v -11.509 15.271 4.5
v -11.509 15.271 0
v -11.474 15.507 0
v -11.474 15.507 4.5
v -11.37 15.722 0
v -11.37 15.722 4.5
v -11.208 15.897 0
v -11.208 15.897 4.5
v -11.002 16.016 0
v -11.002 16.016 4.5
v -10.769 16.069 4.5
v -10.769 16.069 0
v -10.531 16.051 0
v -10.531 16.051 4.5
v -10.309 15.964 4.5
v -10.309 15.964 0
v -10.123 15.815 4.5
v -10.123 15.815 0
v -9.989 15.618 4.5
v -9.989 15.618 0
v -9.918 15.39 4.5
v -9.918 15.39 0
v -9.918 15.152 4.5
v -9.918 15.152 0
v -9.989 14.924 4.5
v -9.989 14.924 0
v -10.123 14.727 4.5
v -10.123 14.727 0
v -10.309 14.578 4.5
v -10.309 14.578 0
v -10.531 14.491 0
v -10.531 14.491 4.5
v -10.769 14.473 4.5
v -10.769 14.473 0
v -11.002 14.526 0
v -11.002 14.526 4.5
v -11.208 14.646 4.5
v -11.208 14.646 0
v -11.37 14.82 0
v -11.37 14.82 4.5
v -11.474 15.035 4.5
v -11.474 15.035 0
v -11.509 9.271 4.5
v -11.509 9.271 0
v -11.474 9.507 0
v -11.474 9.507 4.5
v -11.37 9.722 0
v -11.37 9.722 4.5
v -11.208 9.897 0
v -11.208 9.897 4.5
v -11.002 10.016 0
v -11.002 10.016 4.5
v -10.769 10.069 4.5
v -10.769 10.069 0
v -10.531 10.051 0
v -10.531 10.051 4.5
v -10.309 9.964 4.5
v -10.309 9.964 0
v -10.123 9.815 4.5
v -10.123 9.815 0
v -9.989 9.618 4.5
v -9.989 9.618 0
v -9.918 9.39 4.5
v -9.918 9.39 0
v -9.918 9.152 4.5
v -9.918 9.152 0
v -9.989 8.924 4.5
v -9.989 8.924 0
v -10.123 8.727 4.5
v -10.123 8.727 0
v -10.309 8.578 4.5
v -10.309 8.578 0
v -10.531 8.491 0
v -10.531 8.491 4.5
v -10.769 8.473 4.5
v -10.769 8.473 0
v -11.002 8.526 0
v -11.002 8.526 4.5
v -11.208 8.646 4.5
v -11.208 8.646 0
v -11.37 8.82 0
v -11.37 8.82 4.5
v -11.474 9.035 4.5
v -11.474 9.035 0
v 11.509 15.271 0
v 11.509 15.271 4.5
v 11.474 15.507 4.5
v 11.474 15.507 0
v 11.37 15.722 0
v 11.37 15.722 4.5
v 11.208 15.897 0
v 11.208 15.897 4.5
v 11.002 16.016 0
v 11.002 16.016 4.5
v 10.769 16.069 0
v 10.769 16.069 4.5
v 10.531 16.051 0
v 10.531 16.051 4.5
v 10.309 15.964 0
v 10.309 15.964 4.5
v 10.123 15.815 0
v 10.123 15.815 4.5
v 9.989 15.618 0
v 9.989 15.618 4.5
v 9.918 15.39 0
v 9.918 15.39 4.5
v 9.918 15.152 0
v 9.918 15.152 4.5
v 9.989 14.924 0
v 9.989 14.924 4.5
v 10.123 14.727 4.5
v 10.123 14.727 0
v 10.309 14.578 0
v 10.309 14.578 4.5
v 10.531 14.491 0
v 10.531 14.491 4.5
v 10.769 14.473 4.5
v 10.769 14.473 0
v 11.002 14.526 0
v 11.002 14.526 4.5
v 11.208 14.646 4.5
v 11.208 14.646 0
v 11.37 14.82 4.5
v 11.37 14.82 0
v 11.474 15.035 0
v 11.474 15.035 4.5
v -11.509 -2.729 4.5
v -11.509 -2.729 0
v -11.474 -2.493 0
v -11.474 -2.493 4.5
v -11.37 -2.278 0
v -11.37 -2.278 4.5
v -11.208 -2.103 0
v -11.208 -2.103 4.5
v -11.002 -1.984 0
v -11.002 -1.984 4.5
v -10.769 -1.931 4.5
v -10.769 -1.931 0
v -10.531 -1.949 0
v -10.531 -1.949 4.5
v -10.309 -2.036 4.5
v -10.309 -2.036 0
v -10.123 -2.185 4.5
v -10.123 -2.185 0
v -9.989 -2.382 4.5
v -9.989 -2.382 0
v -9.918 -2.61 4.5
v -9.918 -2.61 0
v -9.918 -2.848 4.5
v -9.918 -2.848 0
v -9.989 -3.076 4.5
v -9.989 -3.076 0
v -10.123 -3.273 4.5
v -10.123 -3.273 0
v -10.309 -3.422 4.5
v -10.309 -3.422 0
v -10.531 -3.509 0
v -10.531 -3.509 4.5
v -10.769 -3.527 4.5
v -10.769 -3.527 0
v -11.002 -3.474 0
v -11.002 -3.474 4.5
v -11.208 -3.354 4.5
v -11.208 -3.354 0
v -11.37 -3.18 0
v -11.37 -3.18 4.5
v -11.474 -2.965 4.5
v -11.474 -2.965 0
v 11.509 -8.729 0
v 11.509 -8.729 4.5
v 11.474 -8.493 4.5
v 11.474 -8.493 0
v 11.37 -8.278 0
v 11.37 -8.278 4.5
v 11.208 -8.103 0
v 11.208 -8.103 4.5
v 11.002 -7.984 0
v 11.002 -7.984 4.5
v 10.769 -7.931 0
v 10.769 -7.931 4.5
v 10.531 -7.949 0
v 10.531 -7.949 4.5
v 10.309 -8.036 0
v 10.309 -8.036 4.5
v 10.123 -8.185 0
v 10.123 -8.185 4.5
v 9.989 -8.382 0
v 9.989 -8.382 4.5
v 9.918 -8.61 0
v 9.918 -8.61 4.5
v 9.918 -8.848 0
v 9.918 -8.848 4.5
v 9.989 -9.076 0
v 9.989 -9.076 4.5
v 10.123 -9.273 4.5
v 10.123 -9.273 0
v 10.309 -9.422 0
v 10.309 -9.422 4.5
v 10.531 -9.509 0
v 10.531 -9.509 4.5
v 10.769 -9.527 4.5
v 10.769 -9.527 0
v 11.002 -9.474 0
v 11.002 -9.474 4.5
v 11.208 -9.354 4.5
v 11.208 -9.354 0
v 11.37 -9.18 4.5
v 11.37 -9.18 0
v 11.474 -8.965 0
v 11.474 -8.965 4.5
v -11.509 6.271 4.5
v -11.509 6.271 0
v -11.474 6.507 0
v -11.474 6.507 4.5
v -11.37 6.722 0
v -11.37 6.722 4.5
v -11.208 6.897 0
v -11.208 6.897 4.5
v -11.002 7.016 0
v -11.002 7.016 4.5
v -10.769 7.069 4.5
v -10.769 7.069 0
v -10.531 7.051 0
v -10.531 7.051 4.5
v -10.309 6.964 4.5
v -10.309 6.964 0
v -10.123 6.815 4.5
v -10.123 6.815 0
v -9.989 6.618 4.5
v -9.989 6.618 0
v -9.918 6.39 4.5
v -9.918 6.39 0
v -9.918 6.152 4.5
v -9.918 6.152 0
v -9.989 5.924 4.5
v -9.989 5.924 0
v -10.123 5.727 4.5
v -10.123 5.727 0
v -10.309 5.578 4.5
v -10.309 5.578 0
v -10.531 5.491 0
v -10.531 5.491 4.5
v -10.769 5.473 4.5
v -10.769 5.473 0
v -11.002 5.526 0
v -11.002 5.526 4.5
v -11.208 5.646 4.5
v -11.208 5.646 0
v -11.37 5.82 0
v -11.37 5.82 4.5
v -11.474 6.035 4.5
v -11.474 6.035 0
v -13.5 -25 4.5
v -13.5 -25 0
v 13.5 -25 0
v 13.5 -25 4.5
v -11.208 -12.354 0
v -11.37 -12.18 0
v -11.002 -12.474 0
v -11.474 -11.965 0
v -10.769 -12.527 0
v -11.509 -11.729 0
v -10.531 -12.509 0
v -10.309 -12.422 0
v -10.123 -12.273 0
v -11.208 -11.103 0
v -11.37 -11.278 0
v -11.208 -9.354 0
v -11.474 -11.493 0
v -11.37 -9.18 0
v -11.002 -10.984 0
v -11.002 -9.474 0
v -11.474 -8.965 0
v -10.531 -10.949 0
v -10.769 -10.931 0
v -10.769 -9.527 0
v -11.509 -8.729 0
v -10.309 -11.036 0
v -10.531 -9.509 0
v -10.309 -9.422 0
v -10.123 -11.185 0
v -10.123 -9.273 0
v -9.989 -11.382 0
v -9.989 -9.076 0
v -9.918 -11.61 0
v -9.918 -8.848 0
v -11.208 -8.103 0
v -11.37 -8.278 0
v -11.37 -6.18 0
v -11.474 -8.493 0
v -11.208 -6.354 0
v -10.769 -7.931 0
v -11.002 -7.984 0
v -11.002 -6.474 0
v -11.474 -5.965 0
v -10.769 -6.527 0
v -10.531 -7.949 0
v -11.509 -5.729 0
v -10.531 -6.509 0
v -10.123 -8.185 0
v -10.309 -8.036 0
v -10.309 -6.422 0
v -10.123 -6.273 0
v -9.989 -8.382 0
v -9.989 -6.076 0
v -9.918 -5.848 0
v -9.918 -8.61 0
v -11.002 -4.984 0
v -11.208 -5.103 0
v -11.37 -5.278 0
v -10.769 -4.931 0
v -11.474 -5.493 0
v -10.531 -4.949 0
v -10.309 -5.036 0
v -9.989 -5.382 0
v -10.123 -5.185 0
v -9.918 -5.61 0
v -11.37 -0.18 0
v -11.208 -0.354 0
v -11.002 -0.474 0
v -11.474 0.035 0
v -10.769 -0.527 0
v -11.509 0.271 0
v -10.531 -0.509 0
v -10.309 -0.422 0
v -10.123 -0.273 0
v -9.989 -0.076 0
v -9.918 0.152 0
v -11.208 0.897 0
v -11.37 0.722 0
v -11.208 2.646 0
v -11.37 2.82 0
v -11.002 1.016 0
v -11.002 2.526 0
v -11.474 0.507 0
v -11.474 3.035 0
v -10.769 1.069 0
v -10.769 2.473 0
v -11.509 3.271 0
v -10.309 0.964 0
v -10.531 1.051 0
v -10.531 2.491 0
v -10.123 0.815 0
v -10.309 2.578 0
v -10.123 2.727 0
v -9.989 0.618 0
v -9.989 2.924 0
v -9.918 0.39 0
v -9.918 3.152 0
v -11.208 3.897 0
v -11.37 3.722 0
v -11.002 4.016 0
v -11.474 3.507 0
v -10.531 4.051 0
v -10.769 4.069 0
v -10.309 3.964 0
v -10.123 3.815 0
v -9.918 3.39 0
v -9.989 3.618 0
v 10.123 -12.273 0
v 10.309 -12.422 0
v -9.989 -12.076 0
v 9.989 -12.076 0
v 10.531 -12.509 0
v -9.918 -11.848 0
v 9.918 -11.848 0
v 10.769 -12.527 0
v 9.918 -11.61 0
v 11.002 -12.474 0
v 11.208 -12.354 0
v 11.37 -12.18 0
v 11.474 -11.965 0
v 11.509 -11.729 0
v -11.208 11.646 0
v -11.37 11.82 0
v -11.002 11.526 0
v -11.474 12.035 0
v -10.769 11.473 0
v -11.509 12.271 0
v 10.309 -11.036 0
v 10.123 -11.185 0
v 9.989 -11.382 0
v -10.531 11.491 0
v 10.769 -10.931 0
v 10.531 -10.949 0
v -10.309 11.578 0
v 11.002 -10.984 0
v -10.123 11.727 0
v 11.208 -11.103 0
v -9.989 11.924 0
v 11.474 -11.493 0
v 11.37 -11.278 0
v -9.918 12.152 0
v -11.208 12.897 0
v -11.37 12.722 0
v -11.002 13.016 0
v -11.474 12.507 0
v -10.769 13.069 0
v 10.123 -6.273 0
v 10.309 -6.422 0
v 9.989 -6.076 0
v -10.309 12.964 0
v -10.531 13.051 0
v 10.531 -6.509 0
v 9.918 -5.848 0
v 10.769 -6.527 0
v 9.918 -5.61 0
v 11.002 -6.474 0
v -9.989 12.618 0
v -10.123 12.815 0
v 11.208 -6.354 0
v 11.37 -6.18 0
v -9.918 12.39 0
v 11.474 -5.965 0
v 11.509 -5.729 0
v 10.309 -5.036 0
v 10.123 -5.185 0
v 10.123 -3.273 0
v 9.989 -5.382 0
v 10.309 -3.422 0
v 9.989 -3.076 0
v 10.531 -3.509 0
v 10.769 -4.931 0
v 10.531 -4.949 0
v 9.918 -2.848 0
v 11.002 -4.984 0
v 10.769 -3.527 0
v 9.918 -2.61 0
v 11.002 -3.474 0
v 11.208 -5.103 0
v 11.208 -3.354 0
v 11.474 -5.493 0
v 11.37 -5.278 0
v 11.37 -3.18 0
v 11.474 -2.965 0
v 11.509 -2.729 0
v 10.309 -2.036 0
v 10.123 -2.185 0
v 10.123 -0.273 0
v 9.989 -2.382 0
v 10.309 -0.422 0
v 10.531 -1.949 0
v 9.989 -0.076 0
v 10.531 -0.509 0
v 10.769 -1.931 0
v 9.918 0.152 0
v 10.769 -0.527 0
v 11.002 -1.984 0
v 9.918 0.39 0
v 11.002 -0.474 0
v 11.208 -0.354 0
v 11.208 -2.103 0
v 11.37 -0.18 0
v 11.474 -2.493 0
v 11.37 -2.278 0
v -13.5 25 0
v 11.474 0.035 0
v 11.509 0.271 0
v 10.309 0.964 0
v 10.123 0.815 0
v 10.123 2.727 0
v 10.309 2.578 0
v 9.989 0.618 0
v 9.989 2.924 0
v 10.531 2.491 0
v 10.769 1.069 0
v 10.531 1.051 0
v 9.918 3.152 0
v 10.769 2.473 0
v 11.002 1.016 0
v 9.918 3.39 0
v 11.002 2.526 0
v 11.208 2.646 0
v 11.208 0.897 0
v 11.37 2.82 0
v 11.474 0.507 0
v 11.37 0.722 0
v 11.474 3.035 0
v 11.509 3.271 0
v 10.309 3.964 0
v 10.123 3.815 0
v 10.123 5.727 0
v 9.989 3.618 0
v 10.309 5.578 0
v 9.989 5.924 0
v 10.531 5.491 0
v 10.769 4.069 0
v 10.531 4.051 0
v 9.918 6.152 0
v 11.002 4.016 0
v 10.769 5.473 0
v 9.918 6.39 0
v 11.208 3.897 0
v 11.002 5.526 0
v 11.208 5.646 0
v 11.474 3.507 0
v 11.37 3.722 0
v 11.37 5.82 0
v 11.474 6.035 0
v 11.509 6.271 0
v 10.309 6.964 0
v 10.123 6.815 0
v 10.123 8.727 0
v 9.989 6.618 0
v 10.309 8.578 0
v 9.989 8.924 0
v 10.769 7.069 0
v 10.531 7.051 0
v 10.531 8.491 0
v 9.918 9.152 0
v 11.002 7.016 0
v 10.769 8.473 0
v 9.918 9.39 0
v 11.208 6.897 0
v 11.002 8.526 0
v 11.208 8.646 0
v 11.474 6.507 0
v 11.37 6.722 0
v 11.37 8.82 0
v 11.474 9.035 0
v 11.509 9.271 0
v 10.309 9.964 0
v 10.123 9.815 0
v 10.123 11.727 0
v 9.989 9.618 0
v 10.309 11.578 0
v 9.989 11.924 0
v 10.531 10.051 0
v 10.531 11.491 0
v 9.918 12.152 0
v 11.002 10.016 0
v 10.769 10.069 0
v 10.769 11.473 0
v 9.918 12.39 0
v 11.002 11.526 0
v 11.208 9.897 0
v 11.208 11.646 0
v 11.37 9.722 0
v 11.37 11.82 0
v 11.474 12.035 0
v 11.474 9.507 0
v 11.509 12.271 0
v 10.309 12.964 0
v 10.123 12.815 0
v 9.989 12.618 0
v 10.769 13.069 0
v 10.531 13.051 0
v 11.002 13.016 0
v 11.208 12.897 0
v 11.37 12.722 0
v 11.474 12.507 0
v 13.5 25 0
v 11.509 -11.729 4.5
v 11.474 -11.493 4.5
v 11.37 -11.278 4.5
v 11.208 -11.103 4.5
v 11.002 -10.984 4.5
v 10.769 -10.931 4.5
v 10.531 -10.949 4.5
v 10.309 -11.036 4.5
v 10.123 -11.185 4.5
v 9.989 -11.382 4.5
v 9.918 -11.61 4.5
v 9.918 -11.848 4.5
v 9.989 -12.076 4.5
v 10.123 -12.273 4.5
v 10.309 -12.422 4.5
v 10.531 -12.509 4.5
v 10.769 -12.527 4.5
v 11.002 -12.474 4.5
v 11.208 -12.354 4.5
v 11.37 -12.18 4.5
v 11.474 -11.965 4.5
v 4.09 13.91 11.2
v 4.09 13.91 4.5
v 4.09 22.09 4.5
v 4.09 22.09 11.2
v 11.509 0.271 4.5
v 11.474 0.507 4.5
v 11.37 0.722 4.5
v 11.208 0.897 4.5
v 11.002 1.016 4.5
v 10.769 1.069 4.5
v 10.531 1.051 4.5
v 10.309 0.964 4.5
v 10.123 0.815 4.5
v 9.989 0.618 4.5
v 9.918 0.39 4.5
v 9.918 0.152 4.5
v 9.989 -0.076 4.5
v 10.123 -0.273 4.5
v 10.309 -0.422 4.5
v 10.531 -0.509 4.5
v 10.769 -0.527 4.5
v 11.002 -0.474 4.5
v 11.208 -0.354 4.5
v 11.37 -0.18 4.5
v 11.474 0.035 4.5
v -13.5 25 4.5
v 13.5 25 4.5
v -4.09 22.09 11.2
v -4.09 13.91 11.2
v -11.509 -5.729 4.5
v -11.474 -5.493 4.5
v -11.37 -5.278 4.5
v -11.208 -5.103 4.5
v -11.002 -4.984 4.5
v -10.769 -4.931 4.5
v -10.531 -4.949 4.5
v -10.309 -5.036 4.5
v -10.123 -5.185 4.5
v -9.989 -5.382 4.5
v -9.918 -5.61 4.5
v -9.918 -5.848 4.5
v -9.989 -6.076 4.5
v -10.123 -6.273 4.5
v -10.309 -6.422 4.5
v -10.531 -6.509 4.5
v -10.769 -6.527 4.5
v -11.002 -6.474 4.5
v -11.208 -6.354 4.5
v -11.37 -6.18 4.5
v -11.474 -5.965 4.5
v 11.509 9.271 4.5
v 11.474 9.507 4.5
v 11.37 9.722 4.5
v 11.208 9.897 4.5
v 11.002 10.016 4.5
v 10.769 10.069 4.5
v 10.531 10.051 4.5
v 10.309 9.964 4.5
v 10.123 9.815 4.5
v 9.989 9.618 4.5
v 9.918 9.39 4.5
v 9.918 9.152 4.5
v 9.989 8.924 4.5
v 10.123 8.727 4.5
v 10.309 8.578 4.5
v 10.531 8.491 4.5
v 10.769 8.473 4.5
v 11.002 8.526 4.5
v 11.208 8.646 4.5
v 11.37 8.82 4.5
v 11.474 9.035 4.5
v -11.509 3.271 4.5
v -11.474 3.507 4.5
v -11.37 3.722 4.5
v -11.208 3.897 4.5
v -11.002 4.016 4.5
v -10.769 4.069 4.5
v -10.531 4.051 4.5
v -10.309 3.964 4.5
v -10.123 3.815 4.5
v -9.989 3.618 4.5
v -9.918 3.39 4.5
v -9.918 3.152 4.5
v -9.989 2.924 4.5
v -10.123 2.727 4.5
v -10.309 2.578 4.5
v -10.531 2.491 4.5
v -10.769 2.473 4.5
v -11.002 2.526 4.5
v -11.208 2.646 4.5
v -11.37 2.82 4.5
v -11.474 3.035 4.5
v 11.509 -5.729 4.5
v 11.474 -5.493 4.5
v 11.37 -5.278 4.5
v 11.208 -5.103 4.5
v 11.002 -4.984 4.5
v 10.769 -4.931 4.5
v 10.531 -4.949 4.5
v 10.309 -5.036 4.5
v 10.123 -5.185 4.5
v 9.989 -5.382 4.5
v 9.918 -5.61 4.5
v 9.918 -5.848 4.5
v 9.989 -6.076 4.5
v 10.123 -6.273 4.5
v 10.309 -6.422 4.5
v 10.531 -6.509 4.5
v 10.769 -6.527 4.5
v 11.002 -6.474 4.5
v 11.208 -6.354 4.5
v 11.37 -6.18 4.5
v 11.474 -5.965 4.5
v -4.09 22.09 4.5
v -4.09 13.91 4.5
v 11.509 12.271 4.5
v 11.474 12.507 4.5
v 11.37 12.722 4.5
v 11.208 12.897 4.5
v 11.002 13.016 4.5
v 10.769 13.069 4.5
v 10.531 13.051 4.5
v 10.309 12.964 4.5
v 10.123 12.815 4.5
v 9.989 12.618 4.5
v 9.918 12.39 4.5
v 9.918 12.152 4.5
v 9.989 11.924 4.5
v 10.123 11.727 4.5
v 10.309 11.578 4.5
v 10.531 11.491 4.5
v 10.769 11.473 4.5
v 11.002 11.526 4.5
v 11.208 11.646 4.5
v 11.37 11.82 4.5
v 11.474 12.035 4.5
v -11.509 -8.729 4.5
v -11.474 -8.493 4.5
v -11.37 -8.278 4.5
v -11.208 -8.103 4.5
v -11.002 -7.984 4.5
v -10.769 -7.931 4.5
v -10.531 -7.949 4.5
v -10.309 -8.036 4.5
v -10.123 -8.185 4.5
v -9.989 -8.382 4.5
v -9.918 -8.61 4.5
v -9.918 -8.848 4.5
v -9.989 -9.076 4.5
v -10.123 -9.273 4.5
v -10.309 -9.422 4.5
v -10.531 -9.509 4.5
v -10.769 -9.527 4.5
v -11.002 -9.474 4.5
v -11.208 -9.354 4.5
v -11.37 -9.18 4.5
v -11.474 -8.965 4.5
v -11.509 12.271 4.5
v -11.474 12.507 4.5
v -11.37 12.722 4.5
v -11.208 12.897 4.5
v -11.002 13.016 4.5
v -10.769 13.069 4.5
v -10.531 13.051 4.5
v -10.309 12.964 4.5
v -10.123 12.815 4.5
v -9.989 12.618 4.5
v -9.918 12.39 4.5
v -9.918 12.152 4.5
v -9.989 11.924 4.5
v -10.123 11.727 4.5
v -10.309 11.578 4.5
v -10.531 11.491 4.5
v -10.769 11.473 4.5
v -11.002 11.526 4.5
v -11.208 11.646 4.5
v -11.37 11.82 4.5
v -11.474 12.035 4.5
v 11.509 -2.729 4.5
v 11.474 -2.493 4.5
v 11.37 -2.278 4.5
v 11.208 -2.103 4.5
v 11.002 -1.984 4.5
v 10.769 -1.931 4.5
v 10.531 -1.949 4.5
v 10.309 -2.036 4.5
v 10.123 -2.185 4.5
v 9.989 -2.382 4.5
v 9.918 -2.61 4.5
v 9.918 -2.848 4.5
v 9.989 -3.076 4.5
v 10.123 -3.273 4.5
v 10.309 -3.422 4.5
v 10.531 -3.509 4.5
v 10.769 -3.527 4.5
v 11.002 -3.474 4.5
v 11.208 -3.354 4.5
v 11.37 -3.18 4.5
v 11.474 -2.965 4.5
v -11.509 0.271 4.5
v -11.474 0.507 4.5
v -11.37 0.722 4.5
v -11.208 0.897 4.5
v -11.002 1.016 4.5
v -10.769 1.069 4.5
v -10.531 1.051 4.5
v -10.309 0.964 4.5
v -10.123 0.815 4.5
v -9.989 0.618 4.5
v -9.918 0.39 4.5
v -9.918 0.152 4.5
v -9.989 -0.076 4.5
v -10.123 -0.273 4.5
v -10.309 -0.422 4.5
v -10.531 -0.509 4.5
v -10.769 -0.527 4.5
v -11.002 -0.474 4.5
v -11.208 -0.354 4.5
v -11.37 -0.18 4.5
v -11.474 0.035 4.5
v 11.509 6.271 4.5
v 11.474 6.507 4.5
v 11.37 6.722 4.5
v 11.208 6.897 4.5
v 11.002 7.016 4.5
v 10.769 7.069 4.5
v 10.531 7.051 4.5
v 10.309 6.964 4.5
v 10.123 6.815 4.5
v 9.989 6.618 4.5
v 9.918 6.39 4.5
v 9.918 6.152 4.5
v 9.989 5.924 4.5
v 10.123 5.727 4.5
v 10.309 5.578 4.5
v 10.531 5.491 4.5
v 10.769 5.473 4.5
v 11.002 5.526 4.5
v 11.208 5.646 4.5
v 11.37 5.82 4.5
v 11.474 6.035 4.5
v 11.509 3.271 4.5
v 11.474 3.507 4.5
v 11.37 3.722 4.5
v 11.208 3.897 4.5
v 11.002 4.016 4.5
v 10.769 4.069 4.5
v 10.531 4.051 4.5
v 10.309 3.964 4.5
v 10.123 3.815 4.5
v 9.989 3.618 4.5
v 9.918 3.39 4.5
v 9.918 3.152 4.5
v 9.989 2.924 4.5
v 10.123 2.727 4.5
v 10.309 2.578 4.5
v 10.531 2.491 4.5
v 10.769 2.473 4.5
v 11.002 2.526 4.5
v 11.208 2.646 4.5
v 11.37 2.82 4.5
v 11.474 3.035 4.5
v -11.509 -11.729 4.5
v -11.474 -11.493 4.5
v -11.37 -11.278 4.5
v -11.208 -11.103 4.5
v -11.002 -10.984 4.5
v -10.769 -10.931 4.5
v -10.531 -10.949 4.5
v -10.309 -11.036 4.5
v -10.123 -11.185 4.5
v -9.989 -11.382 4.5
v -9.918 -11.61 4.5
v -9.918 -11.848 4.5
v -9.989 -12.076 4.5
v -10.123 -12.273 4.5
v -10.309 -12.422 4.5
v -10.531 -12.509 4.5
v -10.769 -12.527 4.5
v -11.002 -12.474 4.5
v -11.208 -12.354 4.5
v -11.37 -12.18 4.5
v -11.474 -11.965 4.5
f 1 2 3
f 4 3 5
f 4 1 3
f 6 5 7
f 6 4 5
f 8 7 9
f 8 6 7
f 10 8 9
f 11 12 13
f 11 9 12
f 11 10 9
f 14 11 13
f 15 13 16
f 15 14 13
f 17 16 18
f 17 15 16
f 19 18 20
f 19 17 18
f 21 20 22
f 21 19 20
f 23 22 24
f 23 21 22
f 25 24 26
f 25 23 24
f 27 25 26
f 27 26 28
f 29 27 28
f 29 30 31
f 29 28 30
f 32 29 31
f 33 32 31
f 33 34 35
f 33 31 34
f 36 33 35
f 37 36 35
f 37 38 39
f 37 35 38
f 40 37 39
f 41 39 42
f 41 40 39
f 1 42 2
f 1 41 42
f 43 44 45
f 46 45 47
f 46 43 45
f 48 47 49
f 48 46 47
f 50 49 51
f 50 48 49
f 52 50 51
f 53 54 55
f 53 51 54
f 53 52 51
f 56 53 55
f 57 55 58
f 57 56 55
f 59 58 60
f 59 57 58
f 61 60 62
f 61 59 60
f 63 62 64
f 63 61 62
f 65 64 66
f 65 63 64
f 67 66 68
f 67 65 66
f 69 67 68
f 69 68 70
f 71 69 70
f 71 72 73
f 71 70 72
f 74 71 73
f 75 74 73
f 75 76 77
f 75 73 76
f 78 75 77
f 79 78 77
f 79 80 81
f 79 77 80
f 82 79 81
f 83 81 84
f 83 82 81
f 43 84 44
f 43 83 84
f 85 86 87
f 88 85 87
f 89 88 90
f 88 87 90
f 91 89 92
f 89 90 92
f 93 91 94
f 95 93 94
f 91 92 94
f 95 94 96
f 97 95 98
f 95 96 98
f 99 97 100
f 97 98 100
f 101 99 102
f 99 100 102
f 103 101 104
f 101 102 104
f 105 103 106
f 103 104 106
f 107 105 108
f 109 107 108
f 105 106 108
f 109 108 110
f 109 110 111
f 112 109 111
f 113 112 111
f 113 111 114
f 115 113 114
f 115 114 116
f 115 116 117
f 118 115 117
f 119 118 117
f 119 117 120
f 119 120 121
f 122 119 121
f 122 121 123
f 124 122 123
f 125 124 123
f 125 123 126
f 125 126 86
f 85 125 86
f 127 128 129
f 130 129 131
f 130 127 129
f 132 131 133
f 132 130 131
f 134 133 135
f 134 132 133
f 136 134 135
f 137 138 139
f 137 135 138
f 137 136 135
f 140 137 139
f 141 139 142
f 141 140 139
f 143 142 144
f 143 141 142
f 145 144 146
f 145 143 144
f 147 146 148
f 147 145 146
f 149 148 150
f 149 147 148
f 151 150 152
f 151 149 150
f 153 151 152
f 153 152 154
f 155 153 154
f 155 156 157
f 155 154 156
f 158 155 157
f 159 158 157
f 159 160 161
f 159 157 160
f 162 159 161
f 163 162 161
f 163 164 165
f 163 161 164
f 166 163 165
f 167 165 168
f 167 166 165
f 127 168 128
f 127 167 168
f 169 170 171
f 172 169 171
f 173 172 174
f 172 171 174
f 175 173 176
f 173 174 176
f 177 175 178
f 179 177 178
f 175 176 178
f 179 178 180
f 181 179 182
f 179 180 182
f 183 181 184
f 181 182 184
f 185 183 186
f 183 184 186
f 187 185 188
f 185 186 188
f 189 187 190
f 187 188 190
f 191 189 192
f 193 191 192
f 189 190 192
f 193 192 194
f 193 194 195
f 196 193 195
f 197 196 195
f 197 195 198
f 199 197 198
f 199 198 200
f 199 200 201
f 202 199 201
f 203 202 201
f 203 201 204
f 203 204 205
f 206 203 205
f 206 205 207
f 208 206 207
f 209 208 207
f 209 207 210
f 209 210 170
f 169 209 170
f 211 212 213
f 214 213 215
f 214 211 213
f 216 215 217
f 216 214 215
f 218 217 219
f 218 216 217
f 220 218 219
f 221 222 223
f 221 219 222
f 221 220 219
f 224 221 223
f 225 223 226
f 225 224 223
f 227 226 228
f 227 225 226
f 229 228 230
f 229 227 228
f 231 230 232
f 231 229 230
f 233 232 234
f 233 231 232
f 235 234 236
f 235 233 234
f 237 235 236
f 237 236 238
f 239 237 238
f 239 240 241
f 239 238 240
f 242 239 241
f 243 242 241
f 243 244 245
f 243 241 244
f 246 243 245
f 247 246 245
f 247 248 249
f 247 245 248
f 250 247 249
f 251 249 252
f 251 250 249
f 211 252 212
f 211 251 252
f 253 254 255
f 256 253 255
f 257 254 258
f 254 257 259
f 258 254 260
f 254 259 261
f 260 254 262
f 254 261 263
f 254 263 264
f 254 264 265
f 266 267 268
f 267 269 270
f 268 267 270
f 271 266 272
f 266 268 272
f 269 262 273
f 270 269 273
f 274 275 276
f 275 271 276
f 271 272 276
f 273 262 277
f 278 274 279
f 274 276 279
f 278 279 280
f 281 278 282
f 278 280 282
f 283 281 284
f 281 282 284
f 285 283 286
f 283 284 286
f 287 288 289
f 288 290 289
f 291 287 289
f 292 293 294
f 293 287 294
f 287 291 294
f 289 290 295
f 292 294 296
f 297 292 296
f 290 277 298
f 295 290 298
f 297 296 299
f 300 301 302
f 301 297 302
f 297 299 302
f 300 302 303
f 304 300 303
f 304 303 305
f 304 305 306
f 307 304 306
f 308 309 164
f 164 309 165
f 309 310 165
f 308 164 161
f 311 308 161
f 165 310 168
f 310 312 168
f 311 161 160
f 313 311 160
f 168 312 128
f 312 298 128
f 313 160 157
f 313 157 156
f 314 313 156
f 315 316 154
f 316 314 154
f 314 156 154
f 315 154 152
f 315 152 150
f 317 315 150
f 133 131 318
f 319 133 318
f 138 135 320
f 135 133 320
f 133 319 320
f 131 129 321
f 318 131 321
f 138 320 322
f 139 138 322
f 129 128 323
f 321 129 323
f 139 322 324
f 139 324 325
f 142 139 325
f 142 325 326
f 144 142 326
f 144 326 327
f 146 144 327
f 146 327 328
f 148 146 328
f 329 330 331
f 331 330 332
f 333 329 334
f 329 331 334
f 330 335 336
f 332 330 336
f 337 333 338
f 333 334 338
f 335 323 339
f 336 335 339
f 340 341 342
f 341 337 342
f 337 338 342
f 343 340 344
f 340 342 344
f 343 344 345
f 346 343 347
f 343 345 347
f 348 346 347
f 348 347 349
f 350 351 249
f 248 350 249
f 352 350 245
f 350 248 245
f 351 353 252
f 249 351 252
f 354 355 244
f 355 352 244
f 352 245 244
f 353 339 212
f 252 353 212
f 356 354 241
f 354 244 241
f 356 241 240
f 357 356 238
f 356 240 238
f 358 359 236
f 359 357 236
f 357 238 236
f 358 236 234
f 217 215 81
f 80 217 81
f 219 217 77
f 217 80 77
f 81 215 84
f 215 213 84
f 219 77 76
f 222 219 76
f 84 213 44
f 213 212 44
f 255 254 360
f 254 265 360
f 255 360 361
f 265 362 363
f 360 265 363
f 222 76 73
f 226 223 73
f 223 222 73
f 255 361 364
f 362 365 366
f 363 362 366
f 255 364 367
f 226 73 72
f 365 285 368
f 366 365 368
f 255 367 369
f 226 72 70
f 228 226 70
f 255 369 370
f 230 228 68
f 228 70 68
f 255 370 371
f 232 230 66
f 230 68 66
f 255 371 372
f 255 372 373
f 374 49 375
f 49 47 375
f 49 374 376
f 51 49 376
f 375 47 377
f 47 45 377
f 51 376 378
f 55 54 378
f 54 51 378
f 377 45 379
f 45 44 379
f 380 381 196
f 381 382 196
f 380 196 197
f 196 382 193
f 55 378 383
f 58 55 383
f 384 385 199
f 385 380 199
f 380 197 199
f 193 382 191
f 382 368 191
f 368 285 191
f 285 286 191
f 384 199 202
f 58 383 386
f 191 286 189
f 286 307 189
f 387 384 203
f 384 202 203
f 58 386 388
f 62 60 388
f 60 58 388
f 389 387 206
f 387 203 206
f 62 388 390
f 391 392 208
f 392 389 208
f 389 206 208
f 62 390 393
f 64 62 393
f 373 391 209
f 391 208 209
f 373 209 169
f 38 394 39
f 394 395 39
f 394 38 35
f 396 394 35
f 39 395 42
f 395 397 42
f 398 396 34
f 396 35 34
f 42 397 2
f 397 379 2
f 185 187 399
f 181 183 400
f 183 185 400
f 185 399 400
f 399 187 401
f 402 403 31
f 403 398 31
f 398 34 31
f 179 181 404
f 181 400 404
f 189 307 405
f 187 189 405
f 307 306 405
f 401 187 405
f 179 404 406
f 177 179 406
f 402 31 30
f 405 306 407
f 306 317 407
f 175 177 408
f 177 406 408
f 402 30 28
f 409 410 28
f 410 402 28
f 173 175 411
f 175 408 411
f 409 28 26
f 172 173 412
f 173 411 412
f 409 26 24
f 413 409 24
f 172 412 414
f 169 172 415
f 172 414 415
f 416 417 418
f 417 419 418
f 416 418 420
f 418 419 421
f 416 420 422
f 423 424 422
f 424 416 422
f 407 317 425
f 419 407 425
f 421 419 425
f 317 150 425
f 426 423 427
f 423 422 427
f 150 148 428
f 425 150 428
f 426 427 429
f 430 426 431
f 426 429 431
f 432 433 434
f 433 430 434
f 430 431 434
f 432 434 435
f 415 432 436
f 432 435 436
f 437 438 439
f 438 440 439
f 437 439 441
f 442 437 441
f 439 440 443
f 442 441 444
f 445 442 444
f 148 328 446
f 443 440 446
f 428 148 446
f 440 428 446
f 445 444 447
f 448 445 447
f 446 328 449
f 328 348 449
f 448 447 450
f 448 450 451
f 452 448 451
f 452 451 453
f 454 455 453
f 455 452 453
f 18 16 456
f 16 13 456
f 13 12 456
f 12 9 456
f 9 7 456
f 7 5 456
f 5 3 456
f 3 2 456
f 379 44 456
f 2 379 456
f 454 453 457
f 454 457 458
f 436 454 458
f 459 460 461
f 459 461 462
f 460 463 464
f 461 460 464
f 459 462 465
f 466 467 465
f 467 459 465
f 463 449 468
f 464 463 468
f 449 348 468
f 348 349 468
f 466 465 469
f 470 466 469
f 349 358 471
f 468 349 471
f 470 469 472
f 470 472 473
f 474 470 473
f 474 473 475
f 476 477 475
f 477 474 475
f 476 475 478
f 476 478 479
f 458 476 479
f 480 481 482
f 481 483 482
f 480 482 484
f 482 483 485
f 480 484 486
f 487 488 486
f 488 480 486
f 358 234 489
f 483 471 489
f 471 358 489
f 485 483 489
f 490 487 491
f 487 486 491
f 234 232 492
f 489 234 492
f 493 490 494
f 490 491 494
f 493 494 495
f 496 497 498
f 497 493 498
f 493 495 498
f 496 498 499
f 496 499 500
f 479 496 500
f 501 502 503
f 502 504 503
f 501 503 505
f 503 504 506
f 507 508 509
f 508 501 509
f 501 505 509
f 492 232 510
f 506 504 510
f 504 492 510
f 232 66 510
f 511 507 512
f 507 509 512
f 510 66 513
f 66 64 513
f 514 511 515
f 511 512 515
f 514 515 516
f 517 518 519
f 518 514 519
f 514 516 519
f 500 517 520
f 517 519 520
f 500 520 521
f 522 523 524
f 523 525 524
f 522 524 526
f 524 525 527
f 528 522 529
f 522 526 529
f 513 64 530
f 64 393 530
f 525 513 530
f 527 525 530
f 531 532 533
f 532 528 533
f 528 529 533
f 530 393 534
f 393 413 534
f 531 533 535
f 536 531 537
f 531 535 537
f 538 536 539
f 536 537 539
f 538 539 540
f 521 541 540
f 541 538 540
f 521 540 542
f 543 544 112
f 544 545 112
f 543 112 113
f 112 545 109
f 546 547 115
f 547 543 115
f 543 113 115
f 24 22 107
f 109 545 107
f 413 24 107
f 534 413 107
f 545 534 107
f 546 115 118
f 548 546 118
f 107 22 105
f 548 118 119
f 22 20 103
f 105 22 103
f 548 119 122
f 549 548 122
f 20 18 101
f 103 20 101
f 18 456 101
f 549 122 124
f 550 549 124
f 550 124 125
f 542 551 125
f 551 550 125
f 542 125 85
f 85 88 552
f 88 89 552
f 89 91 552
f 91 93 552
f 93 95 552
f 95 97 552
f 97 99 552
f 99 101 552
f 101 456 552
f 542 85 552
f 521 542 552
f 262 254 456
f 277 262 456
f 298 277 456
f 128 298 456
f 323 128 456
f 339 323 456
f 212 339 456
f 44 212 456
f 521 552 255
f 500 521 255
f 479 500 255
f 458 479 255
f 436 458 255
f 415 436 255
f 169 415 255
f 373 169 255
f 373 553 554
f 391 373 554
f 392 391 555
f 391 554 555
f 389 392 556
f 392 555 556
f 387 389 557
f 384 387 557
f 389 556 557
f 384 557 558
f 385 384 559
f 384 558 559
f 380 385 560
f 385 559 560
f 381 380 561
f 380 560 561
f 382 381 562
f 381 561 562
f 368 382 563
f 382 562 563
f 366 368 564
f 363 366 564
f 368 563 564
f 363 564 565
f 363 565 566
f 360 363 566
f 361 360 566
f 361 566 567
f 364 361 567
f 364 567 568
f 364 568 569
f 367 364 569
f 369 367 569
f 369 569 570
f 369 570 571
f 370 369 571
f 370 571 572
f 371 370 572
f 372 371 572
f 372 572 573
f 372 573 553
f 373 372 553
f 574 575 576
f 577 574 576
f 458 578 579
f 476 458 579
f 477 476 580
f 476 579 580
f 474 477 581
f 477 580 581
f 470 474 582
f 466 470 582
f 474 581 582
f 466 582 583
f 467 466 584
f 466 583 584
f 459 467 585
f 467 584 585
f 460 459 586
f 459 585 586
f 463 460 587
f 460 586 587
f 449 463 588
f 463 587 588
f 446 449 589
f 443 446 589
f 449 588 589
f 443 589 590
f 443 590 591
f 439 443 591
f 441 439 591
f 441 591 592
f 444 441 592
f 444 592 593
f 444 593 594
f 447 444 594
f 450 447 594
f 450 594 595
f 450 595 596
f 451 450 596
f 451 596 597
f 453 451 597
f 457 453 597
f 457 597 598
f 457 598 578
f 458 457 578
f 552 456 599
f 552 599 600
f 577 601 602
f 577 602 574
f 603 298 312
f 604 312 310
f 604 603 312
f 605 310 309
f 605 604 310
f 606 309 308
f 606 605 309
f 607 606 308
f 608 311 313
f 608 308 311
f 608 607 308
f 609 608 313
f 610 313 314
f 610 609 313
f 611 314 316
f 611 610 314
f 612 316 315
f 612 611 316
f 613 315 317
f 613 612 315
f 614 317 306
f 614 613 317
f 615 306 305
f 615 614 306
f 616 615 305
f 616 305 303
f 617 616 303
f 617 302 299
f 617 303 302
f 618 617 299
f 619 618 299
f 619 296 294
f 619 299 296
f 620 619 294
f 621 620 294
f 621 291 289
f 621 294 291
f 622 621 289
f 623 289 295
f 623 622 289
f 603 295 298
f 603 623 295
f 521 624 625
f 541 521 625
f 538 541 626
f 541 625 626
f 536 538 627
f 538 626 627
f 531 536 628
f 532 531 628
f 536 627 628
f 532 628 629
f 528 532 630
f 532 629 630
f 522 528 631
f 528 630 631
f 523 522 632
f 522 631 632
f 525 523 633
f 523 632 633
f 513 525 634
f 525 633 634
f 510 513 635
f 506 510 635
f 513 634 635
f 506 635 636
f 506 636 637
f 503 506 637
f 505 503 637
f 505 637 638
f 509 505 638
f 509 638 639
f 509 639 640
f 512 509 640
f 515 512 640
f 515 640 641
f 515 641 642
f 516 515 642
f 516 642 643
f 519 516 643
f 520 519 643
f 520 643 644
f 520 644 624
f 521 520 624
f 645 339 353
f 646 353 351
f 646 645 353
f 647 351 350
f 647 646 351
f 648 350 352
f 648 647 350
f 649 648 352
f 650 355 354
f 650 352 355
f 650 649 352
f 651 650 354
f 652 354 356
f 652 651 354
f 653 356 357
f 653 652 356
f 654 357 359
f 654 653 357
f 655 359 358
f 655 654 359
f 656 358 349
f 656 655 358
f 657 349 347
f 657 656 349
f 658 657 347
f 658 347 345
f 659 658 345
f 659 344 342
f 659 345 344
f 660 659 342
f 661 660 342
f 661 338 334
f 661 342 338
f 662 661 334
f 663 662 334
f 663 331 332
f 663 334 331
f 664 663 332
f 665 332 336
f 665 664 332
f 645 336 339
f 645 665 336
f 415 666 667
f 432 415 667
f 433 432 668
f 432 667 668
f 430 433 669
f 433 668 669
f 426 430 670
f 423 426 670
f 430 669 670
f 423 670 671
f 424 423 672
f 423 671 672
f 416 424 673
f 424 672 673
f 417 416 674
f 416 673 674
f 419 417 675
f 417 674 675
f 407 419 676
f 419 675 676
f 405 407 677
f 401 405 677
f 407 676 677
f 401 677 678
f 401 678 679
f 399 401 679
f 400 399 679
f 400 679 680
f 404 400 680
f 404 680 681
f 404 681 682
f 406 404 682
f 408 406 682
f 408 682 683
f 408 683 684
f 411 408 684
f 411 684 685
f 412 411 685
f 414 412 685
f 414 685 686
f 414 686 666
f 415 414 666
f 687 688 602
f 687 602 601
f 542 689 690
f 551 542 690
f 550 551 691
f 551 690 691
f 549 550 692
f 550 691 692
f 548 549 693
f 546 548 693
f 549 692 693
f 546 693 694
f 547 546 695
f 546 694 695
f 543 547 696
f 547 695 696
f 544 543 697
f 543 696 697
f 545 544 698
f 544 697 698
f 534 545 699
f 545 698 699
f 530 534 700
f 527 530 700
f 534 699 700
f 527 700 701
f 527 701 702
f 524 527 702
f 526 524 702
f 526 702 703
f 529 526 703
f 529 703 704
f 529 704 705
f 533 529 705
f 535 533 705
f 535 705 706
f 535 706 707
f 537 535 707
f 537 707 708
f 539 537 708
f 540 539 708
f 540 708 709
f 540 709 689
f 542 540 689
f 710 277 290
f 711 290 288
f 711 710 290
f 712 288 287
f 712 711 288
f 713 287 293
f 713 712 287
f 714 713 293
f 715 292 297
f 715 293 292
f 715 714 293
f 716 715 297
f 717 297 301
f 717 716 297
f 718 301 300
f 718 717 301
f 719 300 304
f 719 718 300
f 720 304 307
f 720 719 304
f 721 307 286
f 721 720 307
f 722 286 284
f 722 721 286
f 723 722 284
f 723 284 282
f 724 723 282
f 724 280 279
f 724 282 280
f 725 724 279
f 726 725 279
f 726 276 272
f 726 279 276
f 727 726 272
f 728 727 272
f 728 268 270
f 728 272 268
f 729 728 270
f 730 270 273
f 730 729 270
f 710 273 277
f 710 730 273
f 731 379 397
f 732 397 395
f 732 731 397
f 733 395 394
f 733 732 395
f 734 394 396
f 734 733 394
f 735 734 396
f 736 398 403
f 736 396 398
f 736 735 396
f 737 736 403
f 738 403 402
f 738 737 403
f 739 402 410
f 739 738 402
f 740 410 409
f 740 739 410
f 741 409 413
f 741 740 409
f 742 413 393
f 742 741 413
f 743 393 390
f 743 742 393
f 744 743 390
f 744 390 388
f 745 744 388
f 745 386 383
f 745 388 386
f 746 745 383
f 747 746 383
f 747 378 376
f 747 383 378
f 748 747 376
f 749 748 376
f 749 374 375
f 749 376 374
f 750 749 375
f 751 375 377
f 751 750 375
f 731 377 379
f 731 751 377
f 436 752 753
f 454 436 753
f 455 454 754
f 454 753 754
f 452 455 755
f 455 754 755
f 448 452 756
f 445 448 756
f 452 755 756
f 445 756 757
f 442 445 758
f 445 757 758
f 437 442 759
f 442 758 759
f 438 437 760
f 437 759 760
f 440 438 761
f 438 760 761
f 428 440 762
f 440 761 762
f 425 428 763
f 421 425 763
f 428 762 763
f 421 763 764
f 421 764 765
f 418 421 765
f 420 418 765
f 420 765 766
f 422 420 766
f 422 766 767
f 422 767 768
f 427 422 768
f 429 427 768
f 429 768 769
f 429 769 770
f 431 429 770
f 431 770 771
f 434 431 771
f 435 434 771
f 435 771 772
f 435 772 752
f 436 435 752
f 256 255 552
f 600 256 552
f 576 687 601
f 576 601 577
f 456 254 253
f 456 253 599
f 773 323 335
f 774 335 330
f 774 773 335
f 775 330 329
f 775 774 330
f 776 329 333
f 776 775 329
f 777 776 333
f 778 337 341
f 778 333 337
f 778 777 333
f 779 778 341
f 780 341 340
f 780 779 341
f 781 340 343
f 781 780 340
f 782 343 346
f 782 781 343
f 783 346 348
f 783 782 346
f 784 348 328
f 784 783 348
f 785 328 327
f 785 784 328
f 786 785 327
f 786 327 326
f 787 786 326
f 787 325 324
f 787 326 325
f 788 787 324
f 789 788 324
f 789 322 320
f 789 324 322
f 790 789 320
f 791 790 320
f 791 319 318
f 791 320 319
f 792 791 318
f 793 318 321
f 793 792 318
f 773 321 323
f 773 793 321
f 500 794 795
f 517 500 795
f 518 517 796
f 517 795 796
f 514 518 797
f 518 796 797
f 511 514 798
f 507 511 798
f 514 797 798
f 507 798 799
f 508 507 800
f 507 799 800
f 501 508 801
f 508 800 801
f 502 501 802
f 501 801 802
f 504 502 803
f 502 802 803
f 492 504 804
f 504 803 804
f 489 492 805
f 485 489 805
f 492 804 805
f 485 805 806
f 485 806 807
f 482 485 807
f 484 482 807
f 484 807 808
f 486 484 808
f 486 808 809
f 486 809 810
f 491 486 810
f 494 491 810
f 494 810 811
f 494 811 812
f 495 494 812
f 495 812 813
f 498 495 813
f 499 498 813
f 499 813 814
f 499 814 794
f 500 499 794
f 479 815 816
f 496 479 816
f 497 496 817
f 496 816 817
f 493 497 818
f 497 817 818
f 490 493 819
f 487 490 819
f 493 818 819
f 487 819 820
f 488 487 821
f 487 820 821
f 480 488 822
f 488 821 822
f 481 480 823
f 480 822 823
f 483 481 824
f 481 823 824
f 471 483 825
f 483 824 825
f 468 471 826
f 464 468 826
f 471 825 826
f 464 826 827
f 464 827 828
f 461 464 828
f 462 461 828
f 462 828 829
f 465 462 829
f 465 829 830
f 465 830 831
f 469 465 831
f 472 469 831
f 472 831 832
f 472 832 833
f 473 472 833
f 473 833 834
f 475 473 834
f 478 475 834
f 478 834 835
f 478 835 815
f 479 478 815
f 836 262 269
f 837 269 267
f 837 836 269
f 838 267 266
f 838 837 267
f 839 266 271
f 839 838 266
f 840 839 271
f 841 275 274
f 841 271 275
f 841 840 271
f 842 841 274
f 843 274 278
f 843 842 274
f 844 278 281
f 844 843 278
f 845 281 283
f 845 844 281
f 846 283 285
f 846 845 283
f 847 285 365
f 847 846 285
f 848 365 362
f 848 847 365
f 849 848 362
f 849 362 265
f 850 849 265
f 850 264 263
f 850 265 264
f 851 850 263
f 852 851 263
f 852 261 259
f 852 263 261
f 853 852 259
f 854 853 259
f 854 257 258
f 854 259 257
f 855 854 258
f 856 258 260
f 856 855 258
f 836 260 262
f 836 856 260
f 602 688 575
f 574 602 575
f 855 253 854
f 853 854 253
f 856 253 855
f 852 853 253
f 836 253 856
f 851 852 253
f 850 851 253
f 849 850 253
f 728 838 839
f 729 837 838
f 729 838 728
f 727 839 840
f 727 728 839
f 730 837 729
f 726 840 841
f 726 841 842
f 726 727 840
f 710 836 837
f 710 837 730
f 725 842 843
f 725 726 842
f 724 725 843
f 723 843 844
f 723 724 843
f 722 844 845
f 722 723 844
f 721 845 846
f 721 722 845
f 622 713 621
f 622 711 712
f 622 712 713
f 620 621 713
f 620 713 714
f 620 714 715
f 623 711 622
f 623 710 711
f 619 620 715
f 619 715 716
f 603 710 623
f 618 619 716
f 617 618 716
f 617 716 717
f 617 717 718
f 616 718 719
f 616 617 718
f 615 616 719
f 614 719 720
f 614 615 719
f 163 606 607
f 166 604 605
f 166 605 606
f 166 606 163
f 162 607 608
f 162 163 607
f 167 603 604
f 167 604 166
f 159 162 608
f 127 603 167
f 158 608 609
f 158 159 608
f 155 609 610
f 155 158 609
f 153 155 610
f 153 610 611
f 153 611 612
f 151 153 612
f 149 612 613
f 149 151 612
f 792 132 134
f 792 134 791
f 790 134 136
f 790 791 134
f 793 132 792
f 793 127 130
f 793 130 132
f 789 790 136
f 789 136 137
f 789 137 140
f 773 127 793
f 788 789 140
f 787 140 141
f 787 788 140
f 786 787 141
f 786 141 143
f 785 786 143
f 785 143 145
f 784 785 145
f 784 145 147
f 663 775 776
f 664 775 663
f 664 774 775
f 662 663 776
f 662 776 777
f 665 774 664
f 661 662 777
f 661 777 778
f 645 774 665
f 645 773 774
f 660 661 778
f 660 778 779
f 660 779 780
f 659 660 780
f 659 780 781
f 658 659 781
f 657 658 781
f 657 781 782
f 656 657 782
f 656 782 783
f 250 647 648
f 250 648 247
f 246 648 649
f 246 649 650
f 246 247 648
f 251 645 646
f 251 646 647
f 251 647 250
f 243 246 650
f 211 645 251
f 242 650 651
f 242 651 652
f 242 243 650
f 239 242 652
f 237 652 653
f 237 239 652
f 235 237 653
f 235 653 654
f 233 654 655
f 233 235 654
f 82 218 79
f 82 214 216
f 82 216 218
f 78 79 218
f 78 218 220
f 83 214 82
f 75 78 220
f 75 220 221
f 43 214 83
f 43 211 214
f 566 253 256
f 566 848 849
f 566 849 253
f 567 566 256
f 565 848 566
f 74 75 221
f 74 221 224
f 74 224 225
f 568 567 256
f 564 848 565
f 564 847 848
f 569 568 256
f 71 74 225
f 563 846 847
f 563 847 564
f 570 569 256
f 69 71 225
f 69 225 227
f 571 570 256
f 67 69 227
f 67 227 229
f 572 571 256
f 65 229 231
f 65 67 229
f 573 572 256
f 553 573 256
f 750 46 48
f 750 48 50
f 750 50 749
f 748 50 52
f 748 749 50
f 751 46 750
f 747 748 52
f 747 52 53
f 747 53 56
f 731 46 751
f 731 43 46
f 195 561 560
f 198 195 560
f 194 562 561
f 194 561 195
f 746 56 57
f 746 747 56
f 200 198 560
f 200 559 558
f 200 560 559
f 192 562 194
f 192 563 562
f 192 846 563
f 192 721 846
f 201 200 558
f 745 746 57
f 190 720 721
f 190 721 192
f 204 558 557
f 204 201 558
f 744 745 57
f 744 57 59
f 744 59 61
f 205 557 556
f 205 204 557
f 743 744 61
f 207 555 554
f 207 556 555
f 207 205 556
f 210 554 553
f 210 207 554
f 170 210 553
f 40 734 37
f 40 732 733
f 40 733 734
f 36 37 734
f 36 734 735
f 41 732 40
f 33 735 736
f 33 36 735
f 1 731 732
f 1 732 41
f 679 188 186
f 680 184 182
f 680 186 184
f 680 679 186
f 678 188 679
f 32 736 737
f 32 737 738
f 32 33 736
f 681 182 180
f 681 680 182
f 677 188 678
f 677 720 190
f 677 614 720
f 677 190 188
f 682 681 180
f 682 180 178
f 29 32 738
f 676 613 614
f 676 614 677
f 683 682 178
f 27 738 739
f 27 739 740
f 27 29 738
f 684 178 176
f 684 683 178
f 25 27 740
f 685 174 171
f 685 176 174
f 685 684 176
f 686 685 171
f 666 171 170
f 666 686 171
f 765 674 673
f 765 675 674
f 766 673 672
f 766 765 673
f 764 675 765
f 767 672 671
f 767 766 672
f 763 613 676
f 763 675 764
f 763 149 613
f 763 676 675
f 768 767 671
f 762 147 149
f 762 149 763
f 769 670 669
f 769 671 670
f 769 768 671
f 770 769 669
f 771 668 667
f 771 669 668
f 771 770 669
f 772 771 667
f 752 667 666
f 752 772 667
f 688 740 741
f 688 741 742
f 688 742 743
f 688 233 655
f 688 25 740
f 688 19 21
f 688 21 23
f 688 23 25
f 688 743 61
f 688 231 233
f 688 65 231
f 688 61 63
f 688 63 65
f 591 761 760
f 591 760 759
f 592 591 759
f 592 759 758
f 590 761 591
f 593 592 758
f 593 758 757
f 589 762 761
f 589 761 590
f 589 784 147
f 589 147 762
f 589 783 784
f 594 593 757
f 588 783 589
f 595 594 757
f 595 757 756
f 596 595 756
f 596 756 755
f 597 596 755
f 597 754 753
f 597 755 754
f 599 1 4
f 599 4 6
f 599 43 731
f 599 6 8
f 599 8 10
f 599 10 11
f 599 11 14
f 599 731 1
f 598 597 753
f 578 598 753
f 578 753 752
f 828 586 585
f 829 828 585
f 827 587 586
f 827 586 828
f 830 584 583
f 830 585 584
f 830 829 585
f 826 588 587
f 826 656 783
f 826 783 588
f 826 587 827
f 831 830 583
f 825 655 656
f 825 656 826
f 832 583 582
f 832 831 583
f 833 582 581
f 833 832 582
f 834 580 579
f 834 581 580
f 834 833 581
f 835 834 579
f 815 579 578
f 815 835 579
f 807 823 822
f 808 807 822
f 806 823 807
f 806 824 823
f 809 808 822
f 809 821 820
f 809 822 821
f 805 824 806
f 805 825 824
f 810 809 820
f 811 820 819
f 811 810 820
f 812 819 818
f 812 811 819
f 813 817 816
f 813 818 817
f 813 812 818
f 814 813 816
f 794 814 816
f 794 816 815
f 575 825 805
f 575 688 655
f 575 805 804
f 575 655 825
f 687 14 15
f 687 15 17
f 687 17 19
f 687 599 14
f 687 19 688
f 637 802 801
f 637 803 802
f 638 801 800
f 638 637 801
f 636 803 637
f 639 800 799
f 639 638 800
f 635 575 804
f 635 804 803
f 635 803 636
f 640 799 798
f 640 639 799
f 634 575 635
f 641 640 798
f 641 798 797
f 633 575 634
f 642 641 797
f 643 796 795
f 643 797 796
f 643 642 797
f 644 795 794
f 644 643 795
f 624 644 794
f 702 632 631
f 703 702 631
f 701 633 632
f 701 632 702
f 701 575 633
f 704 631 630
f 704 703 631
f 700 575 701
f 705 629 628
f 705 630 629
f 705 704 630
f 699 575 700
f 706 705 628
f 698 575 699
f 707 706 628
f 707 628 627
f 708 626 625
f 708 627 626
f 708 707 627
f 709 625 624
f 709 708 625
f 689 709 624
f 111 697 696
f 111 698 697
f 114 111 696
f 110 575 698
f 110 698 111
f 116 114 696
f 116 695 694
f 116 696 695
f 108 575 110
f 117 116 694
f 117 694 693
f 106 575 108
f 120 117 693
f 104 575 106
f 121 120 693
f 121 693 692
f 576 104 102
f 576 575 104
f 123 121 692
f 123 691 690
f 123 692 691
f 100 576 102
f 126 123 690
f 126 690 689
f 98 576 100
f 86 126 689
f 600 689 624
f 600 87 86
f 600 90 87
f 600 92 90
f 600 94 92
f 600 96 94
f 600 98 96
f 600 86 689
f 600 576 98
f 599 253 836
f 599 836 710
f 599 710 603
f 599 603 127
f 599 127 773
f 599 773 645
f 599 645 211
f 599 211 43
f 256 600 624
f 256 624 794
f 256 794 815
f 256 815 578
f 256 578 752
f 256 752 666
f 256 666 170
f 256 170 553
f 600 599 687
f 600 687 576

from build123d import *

# Parameters (mm, degrees)
SKETCH1_W           = 27
SKETCH1_H           = 50
BOSS_EXTRUDE1_DEPTH = 4.5
SKETCH2_W           = 8.18
SKETCH2_H           = 8.18
BOSS_EXTRUDE2_DEPTH = 6.7
SKETCH3_R           = 0.8
CUT_EXTRUDE1_DEPTH  = 6.7


with BuildPart() as part:
    # Sketch1 → Boss-Extrude1 (new body)
    with BuildSketch(Plane.XY):
        Rectangle(SKETCH1_W, SKETCH1_H)
    extrude(amount=BOSS_EXTRUDE1_DEPTH)

    # Sketch2 → Boss-Extrude2 (add)
    with BuildSketch(Plane.XY.offset(4.5)):
        with Locations((0, 18)):
            Rectangle(SKETCH2_W, SKETCH2_H)
    extrude(amount=BOSS_EXTRUDE2_DEPTH)

    # Sketch3 → Cut-Extrude1 (cut)
    with BuildSketch(Plane.XY.offset(4.5)):
        with Locations((10.7092899, 15.271061343)):
            Circle(SKETCH3_R)
        with Locations((10.7092899, 12.271061343)):
            Circle(SKETCH3_R)
        with Locations((10.7092899, 9.271061343)):
            Circle(SKETCH3_R)
        with Locations((10.7092899, 6.271061343)):
            Circle(SKETCH3_R)
        with Locations((10.7092899, 3.271061343)):
            Circle(SKETCH3_R)
        with Locations((10.7092899, 0.271061343)):
            Circle(SKETCH3_R)
        with Locations((10.7092899, -2.728938657)):
            Circle(SKETCH3_R)
        with Locations((10.7092899, -5.728938657)):
            Circle(SKETCH3_R)
        with Locations((10.7092899, -8.728938657)):
            Circle(SKETCH3_R)
        with Locations((10.7092899, -11.728938657)):
            Circle(SKETCH3_R)
    cut_extrude1 = extrude(amount=-CUT_EXTRUDE1_DEPTH, mode=Mode.SUBTRACT)

    # Mirror1: Cut-Extrude1 across plane
    add(cut_extrude1.mirror(Plane(origin=(0, 0, 0), x_dir=(0, 0, 1), z_dir=(1, 0, 0))), mode=Mode.SUBTRACT)


solid = part.part
